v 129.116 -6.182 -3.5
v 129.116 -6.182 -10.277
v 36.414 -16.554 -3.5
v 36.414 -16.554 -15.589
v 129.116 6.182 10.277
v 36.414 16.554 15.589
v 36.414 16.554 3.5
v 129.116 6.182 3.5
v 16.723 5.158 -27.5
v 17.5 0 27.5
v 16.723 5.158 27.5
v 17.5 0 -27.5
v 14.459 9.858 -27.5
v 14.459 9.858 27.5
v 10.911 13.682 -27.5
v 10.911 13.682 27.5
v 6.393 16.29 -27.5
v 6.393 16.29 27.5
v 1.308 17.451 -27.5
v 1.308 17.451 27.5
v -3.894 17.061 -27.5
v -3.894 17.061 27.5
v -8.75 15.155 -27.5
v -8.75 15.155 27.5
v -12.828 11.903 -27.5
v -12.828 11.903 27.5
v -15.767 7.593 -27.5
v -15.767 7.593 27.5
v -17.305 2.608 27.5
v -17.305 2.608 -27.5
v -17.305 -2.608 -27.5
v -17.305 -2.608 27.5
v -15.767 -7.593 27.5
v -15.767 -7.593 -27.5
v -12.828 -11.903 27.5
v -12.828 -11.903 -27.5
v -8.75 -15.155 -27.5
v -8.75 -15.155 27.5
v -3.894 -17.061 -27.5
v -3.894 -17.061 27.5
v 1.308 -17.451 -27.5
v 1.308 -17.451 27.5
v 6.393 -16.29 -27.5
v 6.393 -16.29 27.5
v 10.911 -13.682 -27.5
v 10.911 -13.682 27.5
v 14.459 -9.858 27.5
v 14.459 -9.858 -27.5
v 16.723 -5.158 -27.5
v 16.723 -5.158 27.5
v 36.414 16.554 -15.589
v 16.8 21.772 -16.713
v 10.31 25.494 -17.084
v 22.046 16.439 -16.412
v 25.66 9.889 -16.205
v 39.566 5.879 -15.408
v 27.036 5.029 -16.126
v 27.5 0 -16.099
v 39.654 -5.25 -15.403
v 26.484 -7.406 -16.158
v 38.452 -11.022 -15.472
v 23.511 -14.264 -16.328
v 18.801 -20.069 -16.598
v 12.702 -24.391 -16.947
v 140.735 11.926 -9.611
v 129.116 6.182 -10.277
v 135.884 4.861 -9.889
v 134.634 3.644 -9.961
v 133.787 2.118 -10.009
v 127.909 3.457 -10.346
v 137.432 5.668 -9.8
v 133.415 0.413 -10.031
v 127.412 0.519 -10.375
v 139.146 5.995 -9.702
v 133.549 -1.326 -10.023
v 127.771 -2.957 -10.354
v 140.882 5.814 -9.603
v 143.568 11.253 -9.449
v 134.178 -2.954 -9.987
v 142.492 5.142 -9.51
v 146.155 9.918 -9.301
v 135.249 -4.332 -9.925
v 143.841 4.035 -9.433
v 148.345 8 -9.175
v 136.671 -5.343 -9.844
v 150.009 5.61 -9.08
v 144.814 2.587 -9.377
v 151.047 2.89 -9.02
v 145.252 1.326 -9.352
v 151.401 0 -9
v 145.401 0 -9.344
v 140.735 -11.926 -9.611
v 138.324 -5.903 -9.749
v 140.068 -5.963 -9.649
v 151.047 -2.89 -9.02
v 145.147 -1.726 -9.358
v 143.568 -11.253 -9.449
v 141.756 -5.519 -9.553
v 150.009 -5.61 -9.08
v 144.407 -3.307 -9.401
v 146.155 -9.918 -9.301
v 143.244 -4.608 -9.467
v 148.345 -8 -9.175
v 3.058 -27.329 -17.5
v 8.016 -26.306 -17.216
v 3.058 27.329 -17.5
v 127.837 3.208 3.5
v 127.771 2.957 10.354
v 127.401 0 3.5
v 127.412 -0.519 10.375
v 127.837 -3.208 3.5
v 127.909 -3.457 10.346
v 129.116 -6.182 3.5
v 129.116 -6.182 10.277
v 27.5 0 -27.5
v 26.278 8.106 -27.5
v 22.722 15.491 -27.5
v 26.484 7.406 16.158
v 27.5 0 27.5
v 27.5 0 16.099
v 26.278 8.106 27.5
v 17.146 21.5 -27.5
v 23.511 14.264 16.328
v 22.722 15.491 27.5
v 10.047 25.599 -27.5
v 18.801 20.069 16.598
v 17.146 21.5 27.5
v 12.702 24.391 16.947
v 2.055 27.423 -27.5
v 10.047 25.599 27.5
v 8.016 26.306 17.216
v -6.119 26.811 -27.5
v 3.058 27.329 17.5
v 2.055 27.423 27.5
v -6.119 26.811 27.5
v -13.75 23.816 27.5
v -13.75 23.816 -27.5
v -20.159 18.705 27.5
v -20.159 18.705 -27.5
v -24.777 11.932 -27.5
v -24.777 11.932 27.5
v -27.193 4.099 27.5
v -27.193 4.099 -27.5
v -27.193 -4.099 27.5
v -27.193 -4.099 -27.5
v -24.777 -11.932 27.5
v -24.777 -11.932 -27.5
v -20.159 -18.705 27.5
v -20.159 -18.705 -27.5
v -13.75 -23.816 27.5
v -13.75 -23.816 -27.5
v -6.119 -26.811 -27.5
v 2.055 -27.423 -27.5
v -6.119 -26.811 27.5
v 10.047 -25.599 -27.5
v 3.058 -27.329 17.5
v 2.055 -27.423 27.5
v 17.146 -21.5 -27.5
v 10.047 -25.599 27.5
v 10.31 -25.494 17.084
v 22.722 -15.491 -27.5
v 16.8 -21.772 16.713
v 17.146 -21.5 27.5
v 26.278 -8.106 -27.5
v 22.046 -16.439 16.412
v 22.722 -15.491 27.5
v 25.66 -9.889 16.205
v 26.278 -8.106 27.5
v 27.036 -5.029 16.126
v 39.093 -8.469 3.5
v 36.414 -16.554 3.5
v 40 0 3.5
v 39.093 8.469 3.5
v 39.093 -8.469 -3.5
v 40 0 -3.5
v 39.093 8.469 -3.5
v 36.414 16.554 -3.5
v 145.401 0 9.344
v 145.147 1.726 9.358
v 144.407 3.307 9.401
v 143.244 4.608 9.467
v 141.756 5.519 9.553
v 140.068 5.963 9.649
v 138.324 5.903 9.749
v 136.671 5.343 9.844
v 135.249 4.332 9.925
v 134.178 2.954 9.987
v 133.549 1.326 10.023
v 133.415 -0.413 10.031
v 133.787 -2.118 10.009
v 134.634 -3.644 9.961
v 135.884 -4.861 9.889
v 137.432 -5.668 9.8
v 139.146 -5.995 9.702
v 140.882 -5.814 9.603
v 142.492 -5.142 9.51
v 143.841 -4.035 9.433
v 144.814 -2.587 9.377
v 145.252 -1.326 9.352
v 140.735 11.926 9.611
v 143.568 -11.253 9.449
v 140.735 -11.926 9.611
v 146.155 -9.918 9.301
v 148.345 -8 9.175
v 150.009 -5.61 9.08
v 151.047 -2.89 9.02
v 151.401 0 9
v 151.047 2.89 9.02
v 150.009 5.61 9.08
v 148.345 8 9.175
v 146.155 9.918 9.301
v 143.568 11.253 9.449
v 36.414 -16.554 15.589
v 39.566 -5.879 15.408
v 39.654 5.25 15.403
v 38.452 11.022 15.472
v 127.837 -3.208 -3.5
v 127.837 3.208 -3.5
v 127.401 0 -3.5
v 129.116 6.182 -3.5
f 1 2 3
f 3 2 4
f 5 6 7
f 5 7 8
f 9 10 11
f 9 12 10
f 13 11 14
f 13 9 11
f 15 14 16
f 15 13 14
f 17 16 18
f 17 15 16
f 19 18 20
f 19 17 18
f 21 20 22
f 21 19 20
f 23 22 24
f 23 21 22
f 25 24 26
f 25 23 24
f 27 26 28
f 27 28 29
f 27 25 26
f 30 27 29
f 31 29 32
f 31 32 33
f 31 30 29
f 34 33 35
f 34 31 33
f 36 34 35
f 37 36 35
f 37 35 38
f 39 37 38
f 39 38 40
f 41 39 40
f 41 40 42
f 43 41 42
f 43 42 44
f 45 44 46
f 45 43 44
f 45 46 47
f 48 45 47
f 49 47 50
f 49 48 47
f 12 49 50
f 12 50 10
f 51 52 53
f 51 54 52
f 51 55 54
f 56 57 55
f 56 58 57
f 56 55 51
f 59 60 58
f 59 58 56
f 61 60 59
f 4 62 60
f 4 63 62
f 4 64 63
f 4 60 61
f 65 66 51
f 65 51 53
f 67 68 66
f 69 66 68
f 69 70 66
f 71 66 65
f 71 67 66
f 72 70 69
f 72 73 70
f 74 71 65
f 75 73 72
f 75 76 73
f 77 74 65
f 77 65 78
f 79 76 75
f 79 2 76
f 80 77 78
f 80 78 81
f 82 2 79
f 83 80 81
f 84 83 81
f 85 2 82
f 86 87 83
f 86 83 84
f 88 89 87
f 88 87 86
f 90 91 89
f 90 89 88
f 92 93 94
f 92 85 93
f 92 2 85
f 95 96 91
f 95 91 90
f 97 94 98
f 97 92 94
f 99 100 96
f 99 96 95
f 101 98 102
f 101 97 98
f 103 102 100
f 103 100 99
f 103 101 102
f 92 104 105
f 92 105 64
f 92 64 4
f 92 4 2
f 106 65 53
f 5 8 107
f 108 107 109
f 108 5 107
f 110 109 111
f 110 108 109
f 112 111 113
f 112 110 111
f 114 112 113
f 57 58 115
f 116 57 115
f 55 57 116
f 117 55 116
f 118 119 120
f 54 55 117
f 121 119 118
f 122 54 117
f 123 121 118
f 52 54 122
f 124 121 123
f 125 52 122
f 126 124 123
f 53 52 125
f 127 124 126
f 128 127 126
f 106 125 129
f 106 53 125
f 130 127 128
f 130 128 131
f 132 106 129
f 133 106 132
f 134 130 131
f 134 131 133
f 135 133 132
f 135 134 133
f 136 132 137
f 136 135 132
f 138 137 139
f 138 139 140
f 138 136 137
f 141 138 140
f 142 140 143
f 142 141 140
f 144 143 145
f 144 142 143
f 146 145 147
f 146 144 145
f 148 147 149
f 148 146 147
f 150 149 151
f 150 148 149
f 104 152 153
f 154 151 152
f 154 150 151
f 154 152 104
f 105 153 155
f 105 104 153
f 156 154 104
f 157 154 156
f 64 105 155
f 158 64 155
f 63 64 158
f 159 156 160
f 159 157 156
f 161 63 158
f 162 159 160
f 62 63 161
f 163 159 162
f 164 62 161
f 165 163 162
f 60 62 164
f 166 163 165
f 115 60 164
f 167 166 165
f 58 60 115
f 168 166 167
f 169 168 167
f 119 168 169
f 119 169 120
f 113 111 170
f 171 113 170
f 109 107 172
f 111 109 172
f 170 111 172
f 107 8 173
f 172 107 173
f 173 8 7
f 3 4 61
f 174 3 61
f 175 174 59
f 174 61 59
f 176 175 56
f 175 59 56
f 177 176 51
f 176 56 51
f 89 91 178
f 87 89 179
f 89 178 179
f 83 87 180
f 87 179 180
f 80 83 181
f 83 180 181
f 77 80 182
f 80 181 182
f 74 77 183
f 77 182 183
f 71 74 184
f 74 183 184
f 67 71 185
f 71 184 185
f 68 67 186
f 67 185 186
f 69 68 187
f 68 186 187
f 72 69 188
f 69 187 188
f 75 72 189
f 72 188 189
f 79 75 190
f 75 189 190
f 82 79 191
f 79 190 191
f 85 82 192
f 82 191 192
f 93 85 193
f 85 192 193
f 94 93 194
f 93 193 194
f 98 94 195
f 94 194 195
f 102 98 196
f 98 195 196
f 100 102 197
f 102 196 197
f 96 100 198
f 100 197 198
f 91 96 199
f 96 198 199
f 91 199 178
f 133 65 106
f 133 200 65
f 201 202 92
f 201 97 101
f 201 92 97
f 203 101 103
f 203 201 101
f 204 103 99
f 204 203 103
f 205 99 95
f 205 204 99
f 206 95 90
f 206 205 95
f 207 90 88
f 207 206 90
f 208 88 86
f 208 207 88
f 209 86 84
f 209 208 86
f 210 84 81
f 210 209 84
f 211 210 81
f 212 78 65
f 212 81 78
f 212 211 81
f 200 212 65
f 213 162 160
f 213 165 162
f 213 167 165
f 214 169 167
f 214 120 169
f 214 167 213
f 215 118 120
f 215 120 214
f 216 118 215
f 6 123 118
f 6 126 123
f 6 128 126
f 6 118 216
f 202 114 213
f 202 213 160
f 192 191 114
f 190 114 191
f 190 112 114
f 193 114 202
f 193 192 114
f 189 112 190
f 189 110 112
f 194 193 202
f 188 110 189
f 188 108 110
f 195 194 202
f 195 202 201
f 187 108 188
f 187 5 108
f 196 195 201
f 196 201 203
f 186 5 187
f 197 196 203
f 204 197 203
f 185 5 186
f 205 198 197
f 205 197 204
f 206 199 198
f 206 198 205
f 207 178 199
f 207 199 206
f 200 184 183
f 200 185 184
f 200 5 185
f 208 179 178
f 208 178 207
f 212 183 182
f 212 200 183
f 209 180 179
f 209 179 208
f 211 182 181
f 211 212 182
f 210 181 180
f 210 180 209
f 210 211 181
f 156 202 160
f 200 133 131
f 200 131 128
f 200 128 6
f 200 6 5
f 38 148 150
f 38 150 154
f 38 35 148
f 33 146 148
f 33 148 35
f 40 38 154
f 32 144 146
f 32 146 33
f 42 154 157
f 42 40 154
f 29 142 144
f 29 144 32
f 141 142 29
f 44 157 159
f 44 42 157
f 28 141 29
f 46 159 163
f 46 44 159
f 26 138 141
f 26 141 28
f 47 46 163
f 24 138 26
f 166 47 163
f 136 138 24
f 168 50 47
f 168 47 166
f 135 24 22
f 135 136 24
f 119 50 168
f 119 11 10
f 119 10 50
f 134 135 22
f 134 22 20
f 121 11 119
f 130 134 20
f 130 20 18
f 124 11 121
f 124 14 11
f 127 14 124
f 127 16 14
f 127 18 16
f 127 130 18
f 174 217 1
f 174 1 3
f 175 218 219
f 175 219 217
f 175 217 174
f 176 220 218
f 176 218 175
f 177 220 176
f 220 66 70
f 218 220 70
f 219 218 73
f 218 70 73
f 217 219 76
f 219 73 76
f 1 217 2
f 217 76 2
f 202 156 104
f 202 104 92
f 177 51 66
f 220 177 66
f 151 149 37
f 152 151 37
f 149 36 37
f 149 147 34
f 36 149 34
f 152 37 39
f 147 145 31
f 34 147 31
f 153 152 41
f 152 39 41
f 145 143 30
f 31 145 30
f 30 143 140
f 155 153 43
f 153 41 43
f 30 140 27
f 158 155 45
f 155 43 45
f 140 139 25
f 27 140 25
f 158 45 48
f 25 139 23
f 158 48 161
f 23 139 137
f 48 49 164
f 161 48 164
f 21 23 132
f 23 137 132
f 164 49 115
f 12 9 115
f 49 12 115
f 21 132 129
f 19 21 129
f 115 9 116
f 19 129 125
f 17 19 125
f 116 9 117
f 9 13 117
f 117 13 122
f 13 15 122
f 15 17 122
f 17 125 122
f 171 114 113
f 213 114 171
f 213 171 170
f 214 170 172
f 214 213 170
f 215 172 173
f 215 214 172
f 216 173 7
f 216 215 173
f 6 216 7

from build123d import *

# Parameters (mm, degrees)
BOSS_EXTRUDE1_DEPTH = 27.5
BOSS_EXTRUDE2_DEPTH = 17.5
CUT_EXTRUDE1_DEPTH  = 34
SKETCH3_R           = 17.5
SKETCH3_R_2         = 6
CUT_EXTRUDE2_DEPTH  = 34
CUT_EXTRUDE6_START  = 53
CUT_EXTRUDE6_DEPTH  = 53
SKETCH8_R           = 27.5
CUT_EXTRUDE7_DEPTH  = 47
SKETCH9_R           = 27.5
SKETCH9_R_2         = 17.5
BOSS_EXTRUDE3_DEPTH = 27.5


with BuildPart() as part:
    # Sketch1 → Boss-Extrude1 (new, symmetric)
    with BuildSketch(Plane.XY):
        with BuildLine():
            ThreePointArc((27.5, 0), (20.498019907, 18.332517009), (3.057732372, 27.329476262))
            ThreePointArc((3.057732372, 27.329476262), (-27.5, 0), (3.057732372, -27.329476262))
            ThreePointArc((3.057732372, -27.329476262), (20.498019907, -18.332517009), (27.5, 0))
        make_face()
    extrude(amount=BOSS_EXTRUDE1_DEPTH, both=True)

    # Sketch1<3> → Boss-Extrude2 (add, symmetric)
    with BuildSketch(Plane.XY):
        with BuildLine():
            Line((140.734972422, 11.925589642), (3.057732372, 27.329476262))
            ThreePointArc((3.057732372, 27.329476262), (27.5, 0), (3.057732372, -27.329476262))
            Line((3.057732372, -27.329476262), (140.734972422, -11.925589642))
            ThreePointArc((140.734972422, -11.925589642), (151.400689205, 0), (140.734972422, 11.925589642))
        make_face()
    extrude(amount=BOSS_EXTRUDE2_DEPTH, both=True)

    # Sketch2 → Cut-Extrude1 (cut, symmetric)
    with BuildSketch(Plane(origin=(0, 0, 0), x_dir=(1, 0, 0), z_dir=(0, 1, 0))):
        Polygon((3.057732372, 17.5), (151.400689205, 9), (151.400689205, 17.5), align=None)
        Polygon((151.400689205, -17.5), (151.400689205, -9), (3.057732372, -17.5), align=None)
    extrude(amount=CUT_EXTRUDE1_DEPTH, both=True, mode=Mode.SUBTRACT)

    # Sketch3 → Cut-Extrude2 (cut, symmetric)
    with BuildSketch(Plane.XY):
        Circle(SKETCH3_R)
        with Locations((139.400689205, 0)):
            Circle(SKETCH3_R_2)
    extrude(amount=CUT_EXTRUDE2_DEPTH, both=True, mode=Mode.SUBTRACT)

    # Sketch7 → Cut-Extrude6 (cut)
    with BuildSketch(Plane.XY.offset(3.5).offset(CUT_EXTRUDE6_START)):
        with BuildLine():
            Line((36.413905406, 16.553775796), (129.115571862, 6.181938308))
            ThreePointArc((129.115571862, 6.181938308), (127.400689205, 0), (129.115571862, -6.181938308))
            Line((129.115571862, -6.181938308), (36.413905406, -16.553775796))
            ThreePointArc((36.413905406, -16.553775796), (40, 0), (36.413905406, 16.553775796))
        make_face()
    cut_extrude6 = extrude(amount=-CUT_EXTRUDE6_DEPTH, mode=Mode.SUBTRACT)

    # Mirror2: Cut-Extrude6 across plane
    add(cut_extrude6.mirror(Plane.XY), mode=Mode.SUBTRACT)

    # Sketch8 → Cut-Extrude7 (cut, symmetric)
    with BuildSketch(Plane.XY):
        Circle(SKETCH8_R)
    extrude(amount=CUT_EXTRUDE7_DEPTH, both=True, mode=Mode.SUBTRACT)

    # Sketch9 → Boss-Extrude3 (add, symmetric)
    with BuildSketch(Plane.XY):
        Circle(SKETCH9_R)
        Circle(SKETCH9_R_2, mode=Mode.SUBTRACT)
    extrude(amount=BOSS_EXTRUDE3_DEPTH, both=True)


solid = part.part
